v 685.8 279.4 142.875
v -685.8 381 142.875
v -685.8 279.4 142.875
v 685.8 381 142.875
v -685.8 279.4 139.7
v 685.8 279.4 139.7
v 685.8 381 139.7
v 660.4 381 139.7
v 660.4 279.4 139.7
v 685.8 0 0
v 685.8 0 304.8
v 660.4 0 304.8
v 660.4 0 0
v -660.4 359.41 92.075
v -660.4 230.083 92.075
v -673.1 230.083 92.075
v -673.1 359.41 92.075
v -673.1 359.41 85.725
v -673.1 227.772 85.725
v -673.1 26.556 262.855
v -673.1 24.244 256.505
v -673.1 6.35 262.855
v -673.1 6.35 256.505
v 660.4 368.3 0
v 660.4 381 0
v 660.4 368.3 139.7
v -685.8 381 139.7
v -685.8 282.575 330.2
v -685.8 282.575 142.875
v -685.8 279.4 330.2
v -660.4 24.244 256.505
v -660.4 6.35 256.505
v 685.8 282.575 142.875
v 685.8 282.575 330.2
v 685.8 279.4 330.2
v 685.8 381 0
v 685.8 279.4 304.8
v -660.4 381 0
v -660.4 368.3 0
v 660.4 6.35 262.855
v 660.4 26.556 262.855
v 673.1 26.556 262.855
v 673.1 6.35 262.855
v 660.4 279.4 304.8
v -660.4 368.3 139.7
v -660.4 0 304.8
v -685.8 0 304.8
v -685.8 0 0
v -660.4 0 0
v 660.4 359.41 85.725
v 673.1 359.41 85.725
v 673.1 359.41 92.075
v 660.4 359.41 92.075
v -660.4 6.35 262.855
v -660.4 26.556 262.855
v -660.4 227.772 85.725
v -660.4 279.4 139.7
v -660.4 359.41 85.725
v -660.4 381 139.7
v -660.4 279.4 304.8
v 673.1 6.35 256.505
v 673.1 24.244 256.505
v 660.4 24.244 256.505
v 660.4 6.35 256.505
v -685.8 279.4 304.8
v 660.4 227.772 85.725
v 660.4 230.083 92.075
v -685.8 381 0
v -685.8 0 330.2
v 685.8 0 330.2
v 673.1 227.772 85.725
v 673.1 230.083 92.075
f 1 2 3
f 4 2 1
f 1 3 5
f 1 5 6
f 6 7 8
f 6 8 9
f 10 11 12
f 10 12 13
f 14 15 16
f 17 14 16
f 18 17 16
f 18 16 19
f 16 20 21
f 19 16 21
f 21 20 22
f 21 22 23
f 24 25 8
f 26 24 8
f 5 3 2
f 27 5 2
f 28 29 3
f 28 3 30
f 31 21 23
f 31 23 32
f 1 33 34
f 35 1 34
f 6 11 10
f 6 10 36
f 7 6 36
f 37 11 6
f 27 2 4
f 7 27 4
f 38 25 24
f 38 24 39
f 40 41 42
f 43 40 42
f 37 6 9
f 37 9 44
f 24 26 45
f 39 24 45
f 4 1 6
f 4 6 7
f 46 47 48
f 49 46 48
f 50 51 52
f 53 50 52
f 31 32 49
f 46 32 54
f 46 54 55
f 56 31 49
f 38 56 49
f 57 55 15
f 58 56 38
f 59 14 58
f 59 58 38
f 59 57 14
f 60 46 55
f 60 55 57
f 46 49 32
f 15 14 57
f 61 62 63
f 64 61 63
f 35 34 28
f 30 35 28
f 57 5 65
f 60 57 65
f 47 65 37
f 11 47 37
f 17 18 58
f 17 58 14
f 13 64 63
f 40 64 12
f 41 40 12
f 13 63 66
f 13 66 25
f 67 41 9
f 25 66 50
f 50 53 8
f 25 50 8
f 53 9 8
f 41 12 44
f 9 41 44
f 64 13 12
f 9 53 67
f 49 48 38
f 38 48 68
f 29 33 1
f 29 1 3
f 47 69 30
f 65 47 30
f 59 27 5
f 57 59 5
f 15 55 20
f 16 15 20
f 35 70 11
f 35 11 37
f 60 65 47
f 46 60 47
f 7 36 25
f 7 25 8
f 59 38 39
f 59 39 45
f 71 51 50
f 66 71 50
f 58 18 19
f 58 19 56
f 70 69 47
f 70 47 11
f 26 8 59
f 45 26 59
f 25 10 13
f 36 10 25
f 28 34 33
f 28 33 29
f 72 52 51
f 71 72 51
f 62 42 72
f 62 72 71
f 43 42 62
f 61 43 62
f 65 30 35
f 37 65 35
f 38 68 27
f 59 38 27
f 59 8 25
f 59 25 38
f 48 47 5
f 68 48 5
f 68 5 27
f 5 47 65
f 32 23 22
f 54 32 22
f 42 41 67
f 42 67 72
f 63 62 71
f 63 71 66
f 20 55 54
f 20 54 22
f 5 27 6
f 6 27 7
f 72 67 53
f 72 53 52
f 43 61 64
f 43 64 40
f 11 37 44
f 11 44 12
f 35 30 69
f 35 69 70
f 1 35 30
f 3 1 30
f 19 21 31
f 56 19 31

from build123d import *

# Parameters (mm, degrees)
F2_DEPTH  = 25.4
F6_W      = 25.4
F6_H      = 6.35
F10_W     = 1371.6
F10_H     = 279.4
F11_DEPTH = 25.4
F13_W     = 1371.6
F13_H     = 101.6
F14_DEPTH = 3.175
F16_W     = 1371.6
F16_H     = 187.325
F17_DEPTH = 3.175
F19_W     = 1320.8
F19_H     = 139.7
F20_DEPTH = 12.7


with BuildPart() as f2:
    # F1 (on offset) → F2 (new body)
    with BuildSketch(Plane.YZ.offset(685.8)):
        Polygon((0, 304.8), (0, 0), (381, 0), (381, 139.7), (279.4, 139.7), (279.4, 304.8), align=None)
    extrude(amount=-F2_DEPTH)

    # F7: sweep along a path in F4
    with BuildLine(Plane(origin=(660.4, 0, 0), x_dir=(0, -1, 0), z_dir=(-1, 0, 0))) as f7_path:
        Line((-359.41, 88.9), (-228.9274356335, 88.9))
        Line((-228.9274356335, 88.9), (-25.4, 259.6797961745))
        Line((-25.4, 259.6797961745), (-6.35, 259.6797961745))
    # F6 (on line) → F7 (sweep, cut)
    with BuildSketch(Plane(origin=(0, 359.41, 0), x_dir=(-1, 0, 0), z_dir=(0, 1, 0))):
        with Locations((-660.4, 88.9)):
            Rectangle(F6_W, F6_H)
    sweep(path=f7_path.line, transition=Transition.RIGHT, mode=Mode.SUBTRACT)


with BuildPart() as f8_1:
    # F8: instance of F2
    add(f2.part.mirror(Plane.YZ))


with BuildPart() as f11:
    # F10 (on offset) → F11 (new body)
    with BuildSketch(Plane.XY.offset(330.2)):
        with Locations((0, 139.7)):
            Rectangle(F10_W, F10_H)
    extrude(amount=-F11_DEPTH)


with BuildPart() as f14:
    # F13 (on offset) → F14 (new body, through all)
    with BuildSketch(Plane.XY.offset(142.875)):
        with Locations((0, 330.2)):
            Rectangle(F13_W, F13_H)
    extrude(amount=-F14_DEPTH)


with BuildPart() as f17:
    # F16 (on offset) → F17 (new body, through all)
    with BuildSketch(Plane(origin=(0, 282.575, 0), x_dir=(-1, 0, 0), z_dir=(0, 1, 0))):
        with Locations((0, 236.5375)):
            Rectangle(F16_W, F16_H)
    extrude(amount=-F17_DEPTH)


with BuildPart() as f20:
    # F19 (on offset) → F20 (new body)
    with BuildSketch(Plane(origin=(0, 381, 0), x_dir=(-1, 0, 0), z_dir=(0, 1, 0))):
        with Locations((0, 69.85)):
            Rectangle(F19_W, F19_H)
    extrude(amount=-F20_DEPTH)


solid = Compound([f2.part, f8_1.part, f11.part, f14.part, f17.part, f20.part])
